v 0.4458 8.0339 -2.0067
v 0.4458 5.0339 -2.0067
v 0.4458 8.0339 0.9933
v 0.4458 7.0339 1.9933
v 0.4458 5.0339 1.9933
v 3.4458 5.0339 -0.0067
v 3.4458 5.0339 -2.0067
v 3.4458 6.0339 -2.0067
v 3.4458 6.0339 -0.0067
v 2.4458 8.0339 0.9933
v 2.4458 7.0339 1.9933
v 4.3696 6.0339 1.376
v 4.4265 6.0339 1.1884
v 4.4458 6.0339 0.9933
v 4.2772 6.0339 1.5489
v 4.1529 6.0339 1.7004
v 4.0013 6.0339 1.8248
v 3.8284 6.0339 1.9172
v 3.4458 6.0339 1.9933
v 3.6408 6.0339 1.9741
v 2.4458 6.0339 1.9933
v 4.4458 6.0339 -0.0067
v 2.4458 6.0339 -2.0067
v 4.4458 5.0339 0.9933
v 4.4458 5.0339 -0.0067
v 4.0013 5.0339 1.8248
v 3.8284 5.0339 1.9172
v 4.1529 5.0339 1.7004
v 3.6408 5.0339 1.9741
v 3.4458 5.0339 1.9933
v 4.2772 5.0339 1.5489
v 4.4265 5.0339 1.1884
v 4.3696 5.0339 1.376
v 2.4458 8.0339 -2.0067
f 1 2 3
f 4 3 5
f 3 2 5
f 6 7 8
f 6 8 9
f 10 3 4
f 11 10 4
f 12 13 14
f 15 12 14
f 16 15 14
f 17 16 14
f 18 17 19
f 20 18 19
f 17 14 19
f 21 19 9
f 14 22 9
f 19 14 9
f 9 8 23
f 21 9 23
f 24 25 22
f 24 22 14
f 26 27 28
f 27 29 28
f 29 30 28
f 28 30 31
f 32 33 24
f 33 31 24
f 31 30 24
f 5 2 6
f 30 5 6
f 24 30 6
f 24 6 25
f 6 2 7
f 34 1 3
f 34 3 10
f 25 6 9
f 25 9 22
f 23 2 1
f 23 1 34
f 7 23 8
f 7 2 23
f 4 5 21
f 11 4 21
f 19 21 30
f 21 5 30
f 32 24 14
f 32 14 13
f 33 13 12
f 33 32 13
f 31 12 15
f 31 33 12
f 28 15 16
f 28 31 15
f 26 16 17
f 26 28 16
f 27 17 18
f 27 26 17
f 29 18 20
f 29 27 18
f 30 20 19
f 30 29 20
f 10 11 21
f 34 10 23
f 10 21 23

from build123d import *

# Parameters (mm, degrees)
EXTRUDE_1_DEPTH     = 5
SKETCH_1_3_W        = 10
SKETCH_1_3_H        = 20
EXTRUDE_2_DEPTH     = 15
CUT_EXTRUDE_1_DEPTH = 15
SCALE_1_SCALE       = 0.2


with BuildPart() as part:
    # 草圖1 → 填料-伸長1 (new body)
    with BuildSketch(Plane(origin=(0, 0, 0), x_dir=(1, 0, 0), z_dir=(0, 1, 0))):
        with BuildLine():
            Line((10, 10), (5, 10))
            Line((5, 10), (5, -5))
            Line((5, -5), (5, -10))
            Line((5, -10), (10, -10))
            ThreePointArc((10, -10), (13.535533906, -8.535533906), (15, -5))
            Line((15, -5), (15, 0))
            Line((15, 0), (10, 0))
            Line((10, 0), (10, 10))
        make_face()
    extrude(amount=EXTRUDE_1_DEPTH)

    # 草圖1<3> → 填料-伸長2 (add)
    with BuildSketch(Plane(origin=(0, 0, 0), x_dir=(1, 0, 0), z_dir=(0, 1, 0))):
        Rectangle(SKETCH_1_3_W, SKETCH_1_3_H)
    extrude(amount=EXTRUDE_2_DEPTH)

    # 草圖2 → 除料-伸長1 (cut)
    with BuildSketch(Plane.ZY.offset(5)):
        Polygon((5, 15), (10, 10), (10, 15), align=None)
    extrude(amount=-CUT_EXTRUDE_1_DEPTH, mode=Mode.SUBTRACT)


with BuildPart() as part_1:
    # 縮放比例1: scaled about (1.80718877, 6.292432053, -0.0083263)
    add(part.part.scale(SCALE_1_SCALE).moved(Location((1.445751016, 5.033945642, -0.00666104))))


solid = part_1.part
